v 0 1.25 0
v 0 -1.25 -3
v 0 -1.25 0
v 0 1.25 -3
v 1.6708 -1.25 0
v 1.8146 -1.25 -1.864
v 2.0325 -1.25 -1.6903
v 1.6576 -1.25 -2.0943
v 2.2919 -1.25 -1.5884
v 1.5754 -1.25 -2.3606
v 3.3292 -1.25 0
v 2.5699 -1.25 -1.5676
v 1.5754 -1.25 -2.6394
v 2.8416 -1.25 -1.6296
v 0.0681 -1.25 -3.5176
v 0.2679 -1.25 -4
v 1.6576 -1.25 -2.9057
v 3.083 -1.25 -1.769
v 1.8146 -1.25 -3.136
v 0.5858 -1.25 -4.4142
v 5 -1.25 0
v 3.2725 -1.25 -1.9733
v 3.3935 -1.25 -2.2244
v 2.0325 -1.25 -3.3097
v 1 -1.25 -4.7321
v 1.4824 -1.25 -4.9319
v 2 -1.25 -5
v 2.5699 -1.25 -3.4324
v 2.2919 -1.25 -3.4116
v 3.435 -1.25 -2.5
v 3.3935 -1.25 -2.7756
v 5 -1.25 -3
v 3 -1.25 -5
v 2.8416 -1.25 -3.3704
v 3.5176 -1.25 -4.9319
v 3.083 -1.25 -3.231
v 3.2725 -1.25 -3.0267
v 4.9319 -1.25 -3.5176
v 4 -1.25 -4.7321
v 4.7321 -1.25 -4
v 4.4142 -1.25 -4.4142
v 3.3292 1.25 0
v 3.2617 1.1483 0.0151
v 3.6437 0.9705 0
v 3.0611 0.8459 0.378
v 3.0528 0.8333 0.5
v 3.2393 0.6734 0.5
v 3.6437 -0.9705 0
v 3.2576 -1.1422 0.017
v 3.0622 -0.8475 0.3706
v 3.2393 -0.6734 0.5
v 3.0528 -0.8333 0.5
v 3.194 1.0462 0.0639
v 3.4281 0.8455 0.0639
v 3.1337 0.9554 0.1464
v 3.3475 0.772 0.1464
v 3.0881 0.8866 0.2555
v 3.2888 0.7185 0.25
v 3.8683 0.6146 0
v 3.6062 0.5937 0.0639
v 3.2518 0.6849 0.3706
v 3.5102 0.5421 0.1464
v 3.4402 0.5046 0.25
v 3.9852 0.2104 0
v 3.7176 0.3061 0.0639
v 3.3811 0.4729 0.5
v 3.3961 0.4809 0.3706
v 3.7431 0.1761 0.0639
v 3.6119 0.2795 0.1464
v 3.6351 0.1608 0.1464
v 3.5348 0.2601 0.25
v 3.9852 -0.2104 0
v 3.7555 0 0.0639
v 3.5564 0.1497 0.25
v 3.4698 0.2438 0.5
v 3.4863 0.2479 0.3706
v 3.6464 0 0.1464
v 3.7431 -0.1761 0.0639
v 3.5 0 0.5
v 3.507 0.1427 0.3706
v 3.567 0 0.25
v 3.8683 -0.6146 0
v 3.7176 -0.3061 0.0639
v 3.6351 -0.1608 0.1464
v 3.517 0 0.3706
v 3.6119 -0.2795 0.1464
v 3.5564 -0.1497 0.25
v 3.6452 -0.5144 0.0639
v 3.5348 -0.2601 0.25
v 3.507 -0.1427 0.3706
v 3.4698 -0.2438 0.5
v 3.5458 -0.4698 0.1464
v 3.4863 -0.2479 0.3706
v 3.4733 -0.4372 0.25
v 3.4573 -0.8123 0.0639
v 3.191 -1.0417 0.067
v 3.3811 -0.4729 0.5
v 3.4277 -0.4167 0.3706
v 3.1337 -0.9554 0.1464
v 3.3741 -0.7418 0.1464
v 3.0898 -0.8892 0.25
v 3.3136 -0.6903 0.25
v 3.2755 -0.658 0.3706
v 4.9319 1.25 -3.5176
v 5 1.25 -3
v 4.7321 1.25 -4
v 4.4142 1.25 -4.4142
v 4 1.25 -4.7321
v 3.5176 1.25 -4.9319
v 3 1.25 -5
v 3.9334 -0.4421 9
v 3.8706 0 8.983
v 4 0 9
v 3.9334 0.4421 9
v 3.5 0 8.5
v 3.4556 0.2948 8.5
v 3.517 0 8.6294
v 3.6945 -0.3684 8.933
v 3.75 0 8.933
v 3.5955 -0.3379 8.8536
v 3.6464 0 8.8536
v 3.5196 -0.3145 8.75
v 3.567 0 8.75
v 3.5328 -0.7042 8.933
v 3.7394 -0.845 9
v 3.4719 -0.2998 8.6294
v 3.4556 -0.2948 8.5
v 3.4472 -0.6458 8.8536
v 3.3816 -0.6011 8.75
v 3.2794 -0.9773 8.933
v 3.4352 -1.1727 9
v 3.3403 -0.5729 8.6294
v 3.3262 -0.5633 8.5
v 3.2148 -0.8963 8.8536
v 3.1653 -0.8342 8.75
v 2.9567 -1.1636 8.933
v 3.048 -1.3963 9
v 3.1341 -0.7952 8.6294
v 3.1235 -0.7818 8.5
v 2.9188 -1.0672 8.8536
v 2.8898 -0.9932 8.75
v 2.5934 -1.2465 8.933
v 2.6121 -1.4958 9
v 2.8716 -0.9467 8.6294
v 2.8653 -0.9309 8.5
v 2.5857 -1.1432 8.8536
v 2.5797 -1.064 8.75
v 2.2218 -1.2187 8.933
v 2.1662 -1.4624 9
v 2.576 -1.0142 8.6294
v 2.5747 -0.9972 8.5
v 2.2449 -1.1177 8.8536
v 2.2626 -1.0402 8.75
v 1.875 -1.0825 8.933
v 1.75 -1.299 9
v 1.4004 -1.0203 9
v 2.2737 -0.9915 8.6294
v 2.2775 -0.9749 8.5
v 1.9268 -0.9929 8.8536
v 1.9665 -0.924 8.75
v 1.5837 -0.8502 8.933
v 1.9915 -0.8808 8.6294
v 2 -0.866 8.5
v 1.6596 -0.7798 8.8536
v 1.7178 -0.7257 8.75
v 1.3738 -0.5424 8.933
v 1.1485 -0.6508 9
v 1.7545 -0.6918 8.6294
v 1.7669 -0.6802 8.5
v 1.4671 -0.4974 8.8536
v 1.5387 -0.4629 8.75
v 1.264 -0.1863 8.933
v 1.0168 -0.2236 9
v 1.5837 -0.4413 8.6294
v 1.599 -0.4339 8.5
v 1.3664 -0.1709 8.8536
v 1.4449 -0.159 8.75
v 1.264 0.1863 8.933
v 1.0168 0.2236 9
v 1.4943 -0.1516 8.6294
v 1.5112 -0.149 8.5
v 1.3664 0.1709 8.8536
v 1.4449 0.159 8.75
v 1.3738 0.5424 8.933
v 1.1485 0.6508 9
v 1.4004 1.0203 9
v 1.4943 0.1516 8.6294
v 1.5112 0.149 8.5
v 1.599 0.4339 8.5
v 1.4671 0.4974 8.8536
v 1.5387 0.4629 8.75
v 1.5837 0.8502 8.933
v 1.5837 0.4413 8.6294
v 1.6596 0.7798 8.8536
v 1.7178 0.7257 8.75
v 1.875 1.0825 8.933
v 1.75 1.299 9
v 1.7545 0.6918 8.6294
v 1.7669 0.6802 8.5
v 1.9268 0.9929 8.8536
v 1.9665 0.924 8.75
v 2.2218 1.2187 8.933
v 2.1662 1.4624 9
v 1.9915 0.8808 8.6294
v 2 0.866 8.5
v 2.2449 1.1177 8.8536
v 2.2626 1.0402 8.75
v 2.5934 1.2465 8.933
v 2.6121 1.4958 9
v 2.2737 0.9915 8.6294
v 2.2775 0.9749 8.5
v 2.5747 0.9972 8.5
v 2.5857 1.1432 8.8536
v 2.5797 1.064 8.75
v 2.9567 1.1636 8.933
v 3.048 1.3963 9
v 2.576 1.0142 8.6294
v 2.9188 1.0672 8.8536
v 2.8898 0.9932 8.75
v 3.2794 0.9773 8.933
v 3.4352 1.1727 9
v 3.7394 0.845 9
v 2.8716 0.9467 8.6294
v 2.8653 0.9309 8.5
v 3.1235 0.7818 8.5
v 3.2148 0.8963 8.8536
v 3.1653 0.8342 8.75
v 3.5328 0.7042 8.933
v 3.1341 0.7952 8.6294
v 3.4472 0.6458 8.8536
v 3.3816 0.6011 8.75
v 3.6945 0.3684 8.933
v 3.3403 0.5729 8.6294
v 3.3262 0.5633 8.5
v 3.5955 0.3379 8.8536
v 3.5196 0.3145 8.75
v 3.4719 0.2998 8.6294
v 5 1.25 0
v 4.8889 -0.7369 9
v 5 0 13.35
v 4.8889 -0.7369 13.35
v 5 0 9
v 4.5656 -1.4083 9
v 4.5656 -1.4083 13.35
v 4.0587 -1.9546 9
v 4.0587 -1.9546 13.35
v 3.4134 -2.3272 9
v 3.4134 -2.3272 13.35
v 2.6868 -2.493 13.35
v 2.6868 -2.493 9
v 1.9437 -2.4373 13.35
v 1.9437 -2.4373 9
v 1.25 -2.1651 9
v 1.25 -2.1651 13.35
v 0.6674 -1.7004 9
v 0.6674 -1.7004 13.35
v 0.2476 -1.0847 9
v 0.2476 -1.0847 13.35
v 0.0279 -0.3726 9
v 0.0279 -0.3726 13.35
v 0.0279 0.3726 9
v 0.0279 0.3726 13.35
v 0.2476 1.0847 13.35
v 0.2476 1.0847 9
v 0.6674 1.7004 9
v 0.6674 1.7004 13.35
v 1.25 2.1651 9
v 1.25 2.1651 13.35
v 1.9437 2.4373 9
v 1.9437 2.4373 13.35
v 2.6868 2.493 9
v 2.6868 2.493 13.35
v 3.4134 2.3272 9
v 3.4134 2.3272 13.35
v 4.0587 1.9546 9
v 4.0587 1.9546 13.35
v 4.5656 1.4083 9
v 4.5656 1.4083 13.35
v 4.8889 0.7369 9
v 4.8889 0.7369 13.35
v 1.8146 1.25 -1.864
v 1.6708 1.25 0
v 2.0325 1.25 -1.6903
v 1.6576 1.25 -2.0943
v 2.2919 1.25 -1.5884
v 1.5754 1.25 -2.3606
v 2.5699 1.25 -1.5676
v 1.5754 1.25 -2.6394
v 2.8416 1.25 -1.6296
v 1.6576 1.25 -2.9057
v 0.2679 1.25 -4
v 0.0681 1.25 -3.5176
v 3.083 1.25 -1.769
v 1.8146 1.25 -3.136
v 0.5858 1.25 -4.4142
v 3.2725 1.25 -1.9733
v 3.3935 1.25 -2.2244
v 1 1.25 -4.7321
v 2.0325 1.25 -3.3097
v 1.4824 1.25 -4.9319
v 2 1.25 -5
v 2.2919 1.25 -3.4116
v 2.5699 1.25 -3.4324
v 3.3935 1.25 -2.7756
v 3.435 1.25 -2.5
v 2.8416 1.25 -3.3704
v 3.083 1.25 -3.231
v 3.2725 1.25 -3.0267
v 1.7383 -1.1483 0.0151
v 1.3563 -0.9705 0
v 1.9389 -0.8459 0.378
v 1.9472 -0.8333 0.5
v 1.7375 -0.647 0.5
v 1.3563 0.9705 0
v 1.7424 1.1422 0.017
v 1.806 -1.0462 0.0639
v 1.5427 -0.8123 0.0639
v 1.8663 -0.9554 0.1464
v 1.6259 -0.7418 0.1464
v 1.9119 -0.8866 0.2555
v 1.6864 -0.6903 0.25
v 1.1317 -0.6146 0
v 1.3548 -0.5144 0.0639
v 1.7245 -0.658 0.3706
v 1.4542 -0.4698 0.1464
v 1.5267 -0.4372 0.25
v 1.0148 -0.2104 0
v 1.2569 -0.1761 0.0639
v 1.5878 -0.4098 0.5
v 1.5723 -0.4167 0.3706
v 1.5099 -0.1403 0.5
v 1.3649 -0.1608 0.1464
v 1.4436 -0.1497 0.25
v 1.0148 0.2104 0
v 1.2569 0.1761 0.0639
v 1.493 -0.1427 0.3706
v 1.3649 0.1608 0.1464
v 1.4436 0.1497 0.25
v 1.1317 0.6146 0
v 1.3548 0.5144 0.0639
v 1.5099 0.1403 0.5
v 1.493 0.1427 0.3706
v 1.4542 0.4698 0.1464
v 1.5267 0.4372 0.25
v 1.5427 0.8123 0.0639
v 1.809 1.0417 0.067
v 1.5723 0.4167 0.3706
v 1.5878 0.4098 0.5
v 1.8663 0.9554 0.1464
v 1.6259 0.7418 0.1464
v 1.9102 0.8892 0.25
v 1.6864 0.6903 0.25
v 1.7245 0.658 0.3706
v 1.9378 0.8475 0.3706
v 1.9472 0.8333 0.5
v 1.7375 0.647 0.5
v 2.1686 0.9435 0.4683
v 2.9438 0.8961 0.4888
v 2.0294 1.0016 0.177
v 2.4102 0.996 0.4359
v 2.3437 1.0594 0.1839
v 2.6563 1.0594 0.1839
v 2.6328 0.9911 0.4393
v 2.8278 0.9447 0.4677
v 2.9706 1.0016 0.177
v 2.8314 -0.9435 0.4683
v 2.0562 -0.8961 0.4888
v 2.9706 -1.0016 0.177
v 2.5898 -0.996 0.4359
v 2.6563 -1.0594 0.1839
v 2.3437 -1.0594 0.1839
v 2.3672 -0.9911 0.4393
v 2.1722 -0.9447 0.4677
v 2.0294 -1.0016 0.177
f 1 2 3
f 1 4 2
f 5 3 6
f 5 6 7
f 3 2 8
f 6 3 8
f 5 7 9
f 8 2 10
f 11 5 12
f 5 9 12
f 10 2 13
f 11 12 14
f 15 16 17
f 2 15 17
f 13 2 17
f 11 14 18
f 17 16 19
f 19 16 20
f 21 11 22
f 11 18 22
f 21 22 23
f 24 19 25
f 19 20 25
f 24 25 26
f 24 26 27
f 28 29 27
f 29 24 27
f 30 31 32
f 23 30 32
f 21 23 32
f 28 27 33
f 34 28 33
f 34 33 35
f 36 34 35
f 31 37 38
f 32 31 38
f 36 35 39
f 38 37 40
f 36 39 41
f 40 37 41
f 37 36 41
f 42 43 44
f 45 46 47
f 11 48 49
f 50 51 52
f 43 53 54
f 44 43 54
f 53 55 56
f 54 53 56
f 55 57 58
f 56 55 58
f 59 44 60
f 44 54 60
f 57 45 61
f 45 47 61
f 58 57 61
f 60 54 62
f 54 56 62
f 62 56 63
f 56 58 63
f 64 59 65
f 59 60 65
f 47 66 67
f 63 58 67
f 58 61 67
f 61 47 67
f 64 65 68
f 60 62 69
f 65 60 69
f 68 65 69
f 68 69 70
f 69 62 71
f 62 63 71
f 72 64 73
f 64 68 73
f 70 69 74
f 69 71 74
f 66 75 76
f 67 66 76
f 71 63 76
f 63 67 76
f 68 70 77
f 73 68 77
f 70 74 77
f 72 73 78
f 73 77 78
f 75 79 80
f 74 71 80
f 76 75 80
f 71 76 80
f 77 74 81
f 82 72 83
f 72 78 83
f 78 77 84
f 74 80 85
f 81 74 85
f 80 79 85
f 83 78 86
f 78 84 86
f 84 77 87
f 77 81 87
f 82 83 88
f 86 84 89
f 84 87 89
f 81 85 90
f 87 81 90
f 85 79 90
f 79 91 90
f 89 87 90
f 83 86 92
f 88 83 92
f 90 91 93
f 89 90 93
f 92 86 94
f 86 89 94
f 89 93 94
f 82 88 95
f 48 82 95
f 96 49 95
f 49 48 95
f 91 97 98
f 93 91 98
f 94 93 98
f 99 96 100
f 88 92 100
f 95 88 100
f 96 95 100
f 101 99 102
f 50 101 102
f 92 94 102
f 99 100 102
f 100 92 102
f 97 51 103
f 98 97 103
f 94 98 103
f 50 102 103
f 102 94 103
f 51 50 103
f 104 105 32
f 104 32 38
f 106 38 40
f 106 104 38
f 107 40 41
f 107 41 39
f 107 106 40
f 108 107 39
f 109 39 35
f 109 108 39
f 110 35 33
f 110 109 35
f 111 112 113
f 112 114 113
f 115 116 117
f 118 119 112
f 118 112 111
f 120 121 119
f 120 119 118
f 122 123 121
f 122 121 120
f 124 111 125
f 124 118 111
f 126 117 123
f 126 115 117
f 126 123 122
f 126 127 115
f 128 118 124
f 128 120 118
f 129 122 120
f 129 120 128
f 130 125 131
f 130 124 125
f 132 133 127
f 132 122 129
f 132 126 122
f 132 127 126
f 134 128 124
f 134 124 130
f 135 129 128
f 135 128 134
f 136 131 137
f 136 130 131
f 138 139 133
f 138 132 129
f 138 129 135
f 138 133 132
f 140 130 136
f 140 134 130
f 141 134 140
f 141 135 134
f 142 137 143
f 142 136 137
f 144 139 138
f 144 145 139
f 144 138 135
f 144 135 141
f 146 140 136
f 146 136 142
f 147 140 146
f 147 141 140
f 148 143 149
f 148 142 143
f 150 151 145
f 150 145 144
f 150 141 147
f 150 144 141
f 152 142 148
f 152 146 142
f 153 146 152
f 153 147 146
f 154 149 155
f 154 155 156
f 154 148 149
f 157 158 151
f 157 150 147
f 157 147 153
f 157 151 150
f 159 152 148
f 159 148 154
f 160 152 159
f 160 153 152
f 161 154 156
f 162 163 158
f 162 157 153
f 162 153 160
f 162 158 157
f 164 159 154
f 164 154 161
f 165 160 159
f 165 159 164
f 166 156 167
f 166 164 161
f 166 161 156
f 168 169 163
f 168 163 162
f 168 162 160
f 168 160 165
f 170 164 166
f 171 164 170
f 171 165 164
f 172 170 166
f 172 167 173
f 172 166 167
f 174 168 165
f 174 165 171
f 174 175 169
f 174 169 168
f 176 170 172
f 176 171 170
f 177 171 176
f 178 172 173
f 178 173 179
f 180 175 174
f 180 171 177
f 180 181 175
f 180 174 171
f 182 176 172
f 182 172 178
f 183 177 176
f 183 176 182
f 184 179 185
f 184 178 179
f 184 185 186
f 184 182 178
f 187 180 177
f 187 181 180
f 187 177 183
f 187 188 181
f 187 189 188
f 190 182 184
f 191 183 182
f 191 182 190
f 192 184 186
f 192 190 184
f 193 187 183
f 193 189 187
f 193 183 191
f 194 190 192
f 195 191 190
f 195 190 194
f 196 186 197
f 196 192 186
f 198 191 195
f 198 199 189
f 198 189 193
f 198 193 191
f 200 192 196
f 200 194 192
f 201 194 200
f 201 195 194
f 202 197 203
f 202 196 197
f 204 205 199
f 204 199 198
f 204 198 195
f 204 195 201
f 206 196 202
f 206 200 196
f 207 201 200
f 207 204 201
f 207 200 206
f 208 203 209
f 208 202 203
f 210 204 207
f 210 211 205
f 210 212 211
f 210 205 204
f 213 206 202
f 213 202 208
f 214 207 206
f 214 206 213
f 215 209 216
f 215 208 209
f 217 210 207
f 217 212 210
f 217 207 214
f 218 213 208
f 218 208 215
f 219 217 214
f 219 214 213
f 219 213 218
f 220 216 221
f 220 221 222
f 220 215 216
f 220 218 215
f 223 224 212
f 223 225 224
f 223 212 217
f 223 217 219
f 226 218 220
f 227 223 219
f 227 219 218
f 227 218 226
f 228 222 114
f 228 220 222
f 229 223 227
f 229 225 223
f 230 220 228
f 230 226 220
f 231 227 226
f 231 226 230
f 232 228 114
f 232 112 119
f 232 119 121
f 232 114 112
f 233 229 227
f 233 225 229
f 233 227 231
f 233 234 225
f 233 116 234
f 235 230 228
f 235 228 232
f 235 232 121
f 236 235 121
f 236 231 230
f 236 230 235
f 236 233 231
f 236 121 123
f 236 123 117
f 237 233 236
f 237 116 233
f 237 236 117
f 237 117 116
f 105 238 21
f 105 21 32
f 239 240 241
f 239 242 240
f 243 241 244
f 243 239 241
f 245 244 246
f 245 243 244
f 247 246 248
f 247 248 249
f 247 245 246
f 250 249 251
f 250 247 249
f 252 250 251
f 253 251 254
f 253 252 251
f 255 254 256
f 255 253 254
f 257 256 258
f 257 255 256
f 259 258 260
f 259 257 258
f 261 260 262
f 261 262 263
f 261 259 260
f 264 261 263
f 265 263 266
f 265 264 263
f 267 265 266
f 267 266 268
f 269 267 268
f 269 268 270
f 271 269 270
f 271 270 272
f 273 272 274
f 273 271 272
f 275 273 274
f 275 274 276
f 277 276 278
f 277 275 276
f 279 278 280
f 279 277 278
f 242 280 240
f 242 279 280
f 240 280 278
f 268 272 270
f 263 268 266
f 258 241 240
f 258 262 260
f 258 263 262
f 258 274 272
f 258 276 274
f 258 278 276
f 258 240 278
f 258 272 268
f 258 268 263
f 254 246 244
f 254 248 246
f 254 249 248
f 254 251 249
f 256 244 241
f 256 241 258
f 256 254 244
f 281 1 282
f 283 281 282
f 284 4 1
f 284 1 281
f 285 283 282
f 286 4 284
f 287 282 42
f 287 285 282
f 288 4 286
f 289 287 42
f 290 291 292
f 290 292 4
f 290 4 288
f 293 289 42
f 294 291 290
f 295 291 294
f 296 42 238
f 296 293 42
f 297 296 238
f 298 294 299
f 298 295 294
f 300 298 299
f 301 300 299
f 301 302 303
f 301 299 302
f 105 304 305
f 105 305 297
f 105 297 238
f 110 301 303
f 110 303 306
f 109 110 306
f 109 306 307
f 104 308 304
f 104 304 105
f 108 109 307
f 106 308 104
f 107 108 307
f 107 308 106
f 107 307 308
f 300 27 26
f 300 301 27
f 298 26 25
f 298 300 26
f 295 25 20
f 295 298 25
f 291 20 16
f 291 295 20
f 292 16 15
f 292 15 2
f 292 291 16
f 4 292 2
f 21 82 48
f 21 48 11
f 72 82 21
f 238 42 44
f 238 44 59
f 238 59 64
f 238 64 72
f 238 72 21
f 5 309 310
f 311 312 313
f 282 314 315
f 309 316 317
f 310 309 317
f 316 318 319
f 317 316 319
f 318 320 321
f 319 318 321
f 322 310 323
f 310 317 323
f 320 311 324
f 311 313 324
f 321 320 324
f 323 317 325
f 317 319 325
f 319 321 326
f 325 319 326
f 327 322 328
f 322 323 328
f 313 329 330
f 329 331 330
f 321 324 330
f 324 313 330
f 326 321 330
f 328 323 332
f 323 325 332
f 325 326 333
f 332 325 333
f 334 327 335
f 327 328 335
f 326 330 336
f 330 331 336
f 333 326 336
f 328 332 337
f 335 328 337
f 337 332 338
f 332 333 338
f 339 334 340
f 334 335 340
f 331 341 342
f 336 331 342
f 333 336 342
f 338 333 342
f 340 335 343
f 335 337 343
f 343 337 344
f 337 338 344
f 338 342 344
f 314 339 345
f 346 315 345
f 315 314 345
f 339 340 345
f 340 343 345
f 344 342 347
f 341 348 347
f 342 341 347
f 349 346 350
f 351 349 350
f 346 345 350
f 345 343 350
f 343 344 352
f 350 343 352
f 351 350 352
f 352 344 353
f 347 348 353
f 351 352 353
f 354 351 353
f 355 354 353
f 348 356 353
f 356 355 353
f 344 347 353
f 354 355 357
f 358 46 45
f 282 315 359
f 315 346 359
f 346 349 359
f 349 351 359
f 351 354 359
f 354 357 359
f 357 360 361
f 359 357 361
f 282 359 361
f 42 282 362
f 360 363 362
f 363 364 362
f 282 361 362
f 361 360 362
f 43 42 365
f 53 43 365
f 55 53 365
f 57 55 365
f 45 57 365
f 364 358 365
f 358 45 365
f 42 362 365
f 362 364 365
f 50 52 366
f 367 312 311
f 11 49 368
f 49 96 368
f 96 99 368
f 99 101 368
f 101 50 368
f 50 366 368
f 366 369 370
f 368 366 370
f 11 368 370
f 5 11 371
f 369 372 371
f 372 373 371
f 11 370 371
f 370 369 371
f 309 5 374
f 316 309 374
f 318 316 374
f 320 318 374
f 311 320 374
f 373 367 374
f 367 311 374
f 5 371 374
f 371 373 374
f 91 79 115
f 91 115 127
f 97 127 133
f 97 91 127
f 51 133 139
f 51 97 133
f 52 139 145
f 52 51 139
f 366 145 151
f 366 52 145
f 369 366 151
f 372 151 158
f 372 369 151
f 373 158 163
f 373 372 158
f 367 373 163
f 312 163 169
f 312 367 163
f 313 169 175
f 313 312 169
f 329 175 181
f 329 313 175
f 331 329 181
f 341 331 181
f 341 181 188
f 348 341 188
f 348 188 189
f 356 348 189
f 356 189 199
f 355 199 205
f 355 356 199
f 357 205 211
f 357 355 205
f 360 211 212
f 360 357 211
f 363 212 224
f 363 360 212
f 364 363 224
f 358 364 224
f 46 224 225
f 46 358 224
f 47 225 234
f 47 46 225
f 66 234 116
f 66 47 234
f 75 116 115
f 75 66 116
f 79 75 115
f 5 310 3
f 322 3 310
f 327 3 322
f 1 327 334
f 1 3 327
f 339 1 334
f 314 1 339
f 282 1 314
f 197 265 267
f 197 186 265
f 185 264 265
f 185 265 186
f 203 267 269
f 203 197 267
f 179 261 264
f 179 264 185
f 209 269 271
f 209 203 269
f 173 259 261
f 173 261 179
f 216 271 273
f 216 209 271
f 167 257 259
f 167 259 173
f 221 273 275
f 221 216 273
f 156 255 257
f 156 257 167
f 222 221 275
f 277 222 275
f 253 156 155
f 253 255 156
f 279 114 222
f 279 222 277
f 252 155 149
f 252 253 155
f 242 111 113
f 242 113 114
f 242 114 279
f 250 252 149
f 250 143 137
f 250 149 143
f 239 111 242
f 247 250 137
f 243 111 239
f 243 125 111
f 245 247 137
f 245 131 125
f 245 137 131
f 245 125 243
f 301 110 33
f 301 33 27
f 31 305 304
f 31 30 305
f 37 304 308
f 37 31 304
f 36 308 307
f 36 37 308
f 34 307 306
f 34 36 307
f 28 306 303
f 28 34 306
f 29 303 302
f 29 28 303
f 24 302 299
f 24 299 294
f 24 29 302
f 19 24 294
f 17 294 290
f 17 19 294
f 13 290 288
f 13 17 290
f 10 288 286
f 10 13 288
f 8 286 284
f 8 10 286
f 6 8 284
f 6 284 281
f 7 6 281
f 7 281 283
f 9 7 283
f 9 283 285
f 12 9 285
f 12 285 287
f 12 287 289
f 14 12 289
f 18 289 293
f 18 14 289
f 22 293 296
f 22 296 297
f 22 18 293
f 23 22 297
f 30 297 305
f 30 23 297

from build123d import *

# Parameters (mm, degrees)
SKETCH1_W                = 1
SKETCH1_H                = 9
SKETCH1_3_R              = 0.935
BOSS_EXTRUDE1_DEPTH      = 1.25
BOSS_EXTRUDE1_DEPTH_BACK = 1.25
FILLET1_R                = 0.5
FILLET2_R                = 0.5


with BuildPart() as part:
    # Sketch1 → Revolve1 (revolve)
    with BuildSketch(Plane(origin=(0, 0, 0), x_dir=(1, 0, 0), z_dir=(0, 1, 0))):
        with Locations((3, -4.5)):
            Rectangle(SKETCH1_W, SKETCH1_H)
    revolve(axis=Axis((2.5, 0, 0), (0, 0, -1)))

    # Sketch1_3 → Boss-Extrude1 (add, two sides)
    with BuildSketch(Plane(origin=(0, 0, 0), x_dir=(1, 0, 0), z_dir=(0, 1, 0))) as boss_extrude1_sk:
        with BuildLine():
            Line((0, 0), (5, 0))
            Line((5, 0), (5, 3))
            ThreePointArc((5, 3), (4.414213562, 4.414213562), (3, 5))
            Line((3, 5), (2, 5))
            ThreePointArc((2, 5), (0.585786438, 4.414213562), (0, 3))
            Line((0, 3), (0, 0))
        make_face()
        with Locations((2.5, 2.5)):
            Circle(SKETCH1_3_R, mode=Mode.SUBTRACT)
    extrude(amount=BOSS_EXTRUDE1_DEPTH)
    extrude(boss_extrude1_sk.sketch, amount=-BOSS_EXTRUDE1_DEPTH_BACK)

    # Fillet1
    fillet1_edges = [part.edges().sort_by_distance(p)[0] for p in [
        (1.5, 0, 0),
    ]]
    fillet(fillet1_edges, radius=FILLET1_R)

    # Sketch1_4 → Revolve2 (revolve)
    with BuildSketch(Plane(origin=(0, 0, 0), x_dir=(1, 0, 0), z_dir=(0, 1, 0))):
        Polygon((3.5, -9), (2.5, -9), (2.5, -13.35), (5, -13.35), (5, -9), align=None)
    revolve(axis=Axis((2.5, 0, 0), (0, 0, -1)))

    # Fillet2
    fillet2_edges = [part.edges().sort_by_distance(p)[0] for p in [
        (1.5, 0, 9),
    ]]
    fillet(fillet2_edges, radius=FILLET2_R)


solid = part.part
